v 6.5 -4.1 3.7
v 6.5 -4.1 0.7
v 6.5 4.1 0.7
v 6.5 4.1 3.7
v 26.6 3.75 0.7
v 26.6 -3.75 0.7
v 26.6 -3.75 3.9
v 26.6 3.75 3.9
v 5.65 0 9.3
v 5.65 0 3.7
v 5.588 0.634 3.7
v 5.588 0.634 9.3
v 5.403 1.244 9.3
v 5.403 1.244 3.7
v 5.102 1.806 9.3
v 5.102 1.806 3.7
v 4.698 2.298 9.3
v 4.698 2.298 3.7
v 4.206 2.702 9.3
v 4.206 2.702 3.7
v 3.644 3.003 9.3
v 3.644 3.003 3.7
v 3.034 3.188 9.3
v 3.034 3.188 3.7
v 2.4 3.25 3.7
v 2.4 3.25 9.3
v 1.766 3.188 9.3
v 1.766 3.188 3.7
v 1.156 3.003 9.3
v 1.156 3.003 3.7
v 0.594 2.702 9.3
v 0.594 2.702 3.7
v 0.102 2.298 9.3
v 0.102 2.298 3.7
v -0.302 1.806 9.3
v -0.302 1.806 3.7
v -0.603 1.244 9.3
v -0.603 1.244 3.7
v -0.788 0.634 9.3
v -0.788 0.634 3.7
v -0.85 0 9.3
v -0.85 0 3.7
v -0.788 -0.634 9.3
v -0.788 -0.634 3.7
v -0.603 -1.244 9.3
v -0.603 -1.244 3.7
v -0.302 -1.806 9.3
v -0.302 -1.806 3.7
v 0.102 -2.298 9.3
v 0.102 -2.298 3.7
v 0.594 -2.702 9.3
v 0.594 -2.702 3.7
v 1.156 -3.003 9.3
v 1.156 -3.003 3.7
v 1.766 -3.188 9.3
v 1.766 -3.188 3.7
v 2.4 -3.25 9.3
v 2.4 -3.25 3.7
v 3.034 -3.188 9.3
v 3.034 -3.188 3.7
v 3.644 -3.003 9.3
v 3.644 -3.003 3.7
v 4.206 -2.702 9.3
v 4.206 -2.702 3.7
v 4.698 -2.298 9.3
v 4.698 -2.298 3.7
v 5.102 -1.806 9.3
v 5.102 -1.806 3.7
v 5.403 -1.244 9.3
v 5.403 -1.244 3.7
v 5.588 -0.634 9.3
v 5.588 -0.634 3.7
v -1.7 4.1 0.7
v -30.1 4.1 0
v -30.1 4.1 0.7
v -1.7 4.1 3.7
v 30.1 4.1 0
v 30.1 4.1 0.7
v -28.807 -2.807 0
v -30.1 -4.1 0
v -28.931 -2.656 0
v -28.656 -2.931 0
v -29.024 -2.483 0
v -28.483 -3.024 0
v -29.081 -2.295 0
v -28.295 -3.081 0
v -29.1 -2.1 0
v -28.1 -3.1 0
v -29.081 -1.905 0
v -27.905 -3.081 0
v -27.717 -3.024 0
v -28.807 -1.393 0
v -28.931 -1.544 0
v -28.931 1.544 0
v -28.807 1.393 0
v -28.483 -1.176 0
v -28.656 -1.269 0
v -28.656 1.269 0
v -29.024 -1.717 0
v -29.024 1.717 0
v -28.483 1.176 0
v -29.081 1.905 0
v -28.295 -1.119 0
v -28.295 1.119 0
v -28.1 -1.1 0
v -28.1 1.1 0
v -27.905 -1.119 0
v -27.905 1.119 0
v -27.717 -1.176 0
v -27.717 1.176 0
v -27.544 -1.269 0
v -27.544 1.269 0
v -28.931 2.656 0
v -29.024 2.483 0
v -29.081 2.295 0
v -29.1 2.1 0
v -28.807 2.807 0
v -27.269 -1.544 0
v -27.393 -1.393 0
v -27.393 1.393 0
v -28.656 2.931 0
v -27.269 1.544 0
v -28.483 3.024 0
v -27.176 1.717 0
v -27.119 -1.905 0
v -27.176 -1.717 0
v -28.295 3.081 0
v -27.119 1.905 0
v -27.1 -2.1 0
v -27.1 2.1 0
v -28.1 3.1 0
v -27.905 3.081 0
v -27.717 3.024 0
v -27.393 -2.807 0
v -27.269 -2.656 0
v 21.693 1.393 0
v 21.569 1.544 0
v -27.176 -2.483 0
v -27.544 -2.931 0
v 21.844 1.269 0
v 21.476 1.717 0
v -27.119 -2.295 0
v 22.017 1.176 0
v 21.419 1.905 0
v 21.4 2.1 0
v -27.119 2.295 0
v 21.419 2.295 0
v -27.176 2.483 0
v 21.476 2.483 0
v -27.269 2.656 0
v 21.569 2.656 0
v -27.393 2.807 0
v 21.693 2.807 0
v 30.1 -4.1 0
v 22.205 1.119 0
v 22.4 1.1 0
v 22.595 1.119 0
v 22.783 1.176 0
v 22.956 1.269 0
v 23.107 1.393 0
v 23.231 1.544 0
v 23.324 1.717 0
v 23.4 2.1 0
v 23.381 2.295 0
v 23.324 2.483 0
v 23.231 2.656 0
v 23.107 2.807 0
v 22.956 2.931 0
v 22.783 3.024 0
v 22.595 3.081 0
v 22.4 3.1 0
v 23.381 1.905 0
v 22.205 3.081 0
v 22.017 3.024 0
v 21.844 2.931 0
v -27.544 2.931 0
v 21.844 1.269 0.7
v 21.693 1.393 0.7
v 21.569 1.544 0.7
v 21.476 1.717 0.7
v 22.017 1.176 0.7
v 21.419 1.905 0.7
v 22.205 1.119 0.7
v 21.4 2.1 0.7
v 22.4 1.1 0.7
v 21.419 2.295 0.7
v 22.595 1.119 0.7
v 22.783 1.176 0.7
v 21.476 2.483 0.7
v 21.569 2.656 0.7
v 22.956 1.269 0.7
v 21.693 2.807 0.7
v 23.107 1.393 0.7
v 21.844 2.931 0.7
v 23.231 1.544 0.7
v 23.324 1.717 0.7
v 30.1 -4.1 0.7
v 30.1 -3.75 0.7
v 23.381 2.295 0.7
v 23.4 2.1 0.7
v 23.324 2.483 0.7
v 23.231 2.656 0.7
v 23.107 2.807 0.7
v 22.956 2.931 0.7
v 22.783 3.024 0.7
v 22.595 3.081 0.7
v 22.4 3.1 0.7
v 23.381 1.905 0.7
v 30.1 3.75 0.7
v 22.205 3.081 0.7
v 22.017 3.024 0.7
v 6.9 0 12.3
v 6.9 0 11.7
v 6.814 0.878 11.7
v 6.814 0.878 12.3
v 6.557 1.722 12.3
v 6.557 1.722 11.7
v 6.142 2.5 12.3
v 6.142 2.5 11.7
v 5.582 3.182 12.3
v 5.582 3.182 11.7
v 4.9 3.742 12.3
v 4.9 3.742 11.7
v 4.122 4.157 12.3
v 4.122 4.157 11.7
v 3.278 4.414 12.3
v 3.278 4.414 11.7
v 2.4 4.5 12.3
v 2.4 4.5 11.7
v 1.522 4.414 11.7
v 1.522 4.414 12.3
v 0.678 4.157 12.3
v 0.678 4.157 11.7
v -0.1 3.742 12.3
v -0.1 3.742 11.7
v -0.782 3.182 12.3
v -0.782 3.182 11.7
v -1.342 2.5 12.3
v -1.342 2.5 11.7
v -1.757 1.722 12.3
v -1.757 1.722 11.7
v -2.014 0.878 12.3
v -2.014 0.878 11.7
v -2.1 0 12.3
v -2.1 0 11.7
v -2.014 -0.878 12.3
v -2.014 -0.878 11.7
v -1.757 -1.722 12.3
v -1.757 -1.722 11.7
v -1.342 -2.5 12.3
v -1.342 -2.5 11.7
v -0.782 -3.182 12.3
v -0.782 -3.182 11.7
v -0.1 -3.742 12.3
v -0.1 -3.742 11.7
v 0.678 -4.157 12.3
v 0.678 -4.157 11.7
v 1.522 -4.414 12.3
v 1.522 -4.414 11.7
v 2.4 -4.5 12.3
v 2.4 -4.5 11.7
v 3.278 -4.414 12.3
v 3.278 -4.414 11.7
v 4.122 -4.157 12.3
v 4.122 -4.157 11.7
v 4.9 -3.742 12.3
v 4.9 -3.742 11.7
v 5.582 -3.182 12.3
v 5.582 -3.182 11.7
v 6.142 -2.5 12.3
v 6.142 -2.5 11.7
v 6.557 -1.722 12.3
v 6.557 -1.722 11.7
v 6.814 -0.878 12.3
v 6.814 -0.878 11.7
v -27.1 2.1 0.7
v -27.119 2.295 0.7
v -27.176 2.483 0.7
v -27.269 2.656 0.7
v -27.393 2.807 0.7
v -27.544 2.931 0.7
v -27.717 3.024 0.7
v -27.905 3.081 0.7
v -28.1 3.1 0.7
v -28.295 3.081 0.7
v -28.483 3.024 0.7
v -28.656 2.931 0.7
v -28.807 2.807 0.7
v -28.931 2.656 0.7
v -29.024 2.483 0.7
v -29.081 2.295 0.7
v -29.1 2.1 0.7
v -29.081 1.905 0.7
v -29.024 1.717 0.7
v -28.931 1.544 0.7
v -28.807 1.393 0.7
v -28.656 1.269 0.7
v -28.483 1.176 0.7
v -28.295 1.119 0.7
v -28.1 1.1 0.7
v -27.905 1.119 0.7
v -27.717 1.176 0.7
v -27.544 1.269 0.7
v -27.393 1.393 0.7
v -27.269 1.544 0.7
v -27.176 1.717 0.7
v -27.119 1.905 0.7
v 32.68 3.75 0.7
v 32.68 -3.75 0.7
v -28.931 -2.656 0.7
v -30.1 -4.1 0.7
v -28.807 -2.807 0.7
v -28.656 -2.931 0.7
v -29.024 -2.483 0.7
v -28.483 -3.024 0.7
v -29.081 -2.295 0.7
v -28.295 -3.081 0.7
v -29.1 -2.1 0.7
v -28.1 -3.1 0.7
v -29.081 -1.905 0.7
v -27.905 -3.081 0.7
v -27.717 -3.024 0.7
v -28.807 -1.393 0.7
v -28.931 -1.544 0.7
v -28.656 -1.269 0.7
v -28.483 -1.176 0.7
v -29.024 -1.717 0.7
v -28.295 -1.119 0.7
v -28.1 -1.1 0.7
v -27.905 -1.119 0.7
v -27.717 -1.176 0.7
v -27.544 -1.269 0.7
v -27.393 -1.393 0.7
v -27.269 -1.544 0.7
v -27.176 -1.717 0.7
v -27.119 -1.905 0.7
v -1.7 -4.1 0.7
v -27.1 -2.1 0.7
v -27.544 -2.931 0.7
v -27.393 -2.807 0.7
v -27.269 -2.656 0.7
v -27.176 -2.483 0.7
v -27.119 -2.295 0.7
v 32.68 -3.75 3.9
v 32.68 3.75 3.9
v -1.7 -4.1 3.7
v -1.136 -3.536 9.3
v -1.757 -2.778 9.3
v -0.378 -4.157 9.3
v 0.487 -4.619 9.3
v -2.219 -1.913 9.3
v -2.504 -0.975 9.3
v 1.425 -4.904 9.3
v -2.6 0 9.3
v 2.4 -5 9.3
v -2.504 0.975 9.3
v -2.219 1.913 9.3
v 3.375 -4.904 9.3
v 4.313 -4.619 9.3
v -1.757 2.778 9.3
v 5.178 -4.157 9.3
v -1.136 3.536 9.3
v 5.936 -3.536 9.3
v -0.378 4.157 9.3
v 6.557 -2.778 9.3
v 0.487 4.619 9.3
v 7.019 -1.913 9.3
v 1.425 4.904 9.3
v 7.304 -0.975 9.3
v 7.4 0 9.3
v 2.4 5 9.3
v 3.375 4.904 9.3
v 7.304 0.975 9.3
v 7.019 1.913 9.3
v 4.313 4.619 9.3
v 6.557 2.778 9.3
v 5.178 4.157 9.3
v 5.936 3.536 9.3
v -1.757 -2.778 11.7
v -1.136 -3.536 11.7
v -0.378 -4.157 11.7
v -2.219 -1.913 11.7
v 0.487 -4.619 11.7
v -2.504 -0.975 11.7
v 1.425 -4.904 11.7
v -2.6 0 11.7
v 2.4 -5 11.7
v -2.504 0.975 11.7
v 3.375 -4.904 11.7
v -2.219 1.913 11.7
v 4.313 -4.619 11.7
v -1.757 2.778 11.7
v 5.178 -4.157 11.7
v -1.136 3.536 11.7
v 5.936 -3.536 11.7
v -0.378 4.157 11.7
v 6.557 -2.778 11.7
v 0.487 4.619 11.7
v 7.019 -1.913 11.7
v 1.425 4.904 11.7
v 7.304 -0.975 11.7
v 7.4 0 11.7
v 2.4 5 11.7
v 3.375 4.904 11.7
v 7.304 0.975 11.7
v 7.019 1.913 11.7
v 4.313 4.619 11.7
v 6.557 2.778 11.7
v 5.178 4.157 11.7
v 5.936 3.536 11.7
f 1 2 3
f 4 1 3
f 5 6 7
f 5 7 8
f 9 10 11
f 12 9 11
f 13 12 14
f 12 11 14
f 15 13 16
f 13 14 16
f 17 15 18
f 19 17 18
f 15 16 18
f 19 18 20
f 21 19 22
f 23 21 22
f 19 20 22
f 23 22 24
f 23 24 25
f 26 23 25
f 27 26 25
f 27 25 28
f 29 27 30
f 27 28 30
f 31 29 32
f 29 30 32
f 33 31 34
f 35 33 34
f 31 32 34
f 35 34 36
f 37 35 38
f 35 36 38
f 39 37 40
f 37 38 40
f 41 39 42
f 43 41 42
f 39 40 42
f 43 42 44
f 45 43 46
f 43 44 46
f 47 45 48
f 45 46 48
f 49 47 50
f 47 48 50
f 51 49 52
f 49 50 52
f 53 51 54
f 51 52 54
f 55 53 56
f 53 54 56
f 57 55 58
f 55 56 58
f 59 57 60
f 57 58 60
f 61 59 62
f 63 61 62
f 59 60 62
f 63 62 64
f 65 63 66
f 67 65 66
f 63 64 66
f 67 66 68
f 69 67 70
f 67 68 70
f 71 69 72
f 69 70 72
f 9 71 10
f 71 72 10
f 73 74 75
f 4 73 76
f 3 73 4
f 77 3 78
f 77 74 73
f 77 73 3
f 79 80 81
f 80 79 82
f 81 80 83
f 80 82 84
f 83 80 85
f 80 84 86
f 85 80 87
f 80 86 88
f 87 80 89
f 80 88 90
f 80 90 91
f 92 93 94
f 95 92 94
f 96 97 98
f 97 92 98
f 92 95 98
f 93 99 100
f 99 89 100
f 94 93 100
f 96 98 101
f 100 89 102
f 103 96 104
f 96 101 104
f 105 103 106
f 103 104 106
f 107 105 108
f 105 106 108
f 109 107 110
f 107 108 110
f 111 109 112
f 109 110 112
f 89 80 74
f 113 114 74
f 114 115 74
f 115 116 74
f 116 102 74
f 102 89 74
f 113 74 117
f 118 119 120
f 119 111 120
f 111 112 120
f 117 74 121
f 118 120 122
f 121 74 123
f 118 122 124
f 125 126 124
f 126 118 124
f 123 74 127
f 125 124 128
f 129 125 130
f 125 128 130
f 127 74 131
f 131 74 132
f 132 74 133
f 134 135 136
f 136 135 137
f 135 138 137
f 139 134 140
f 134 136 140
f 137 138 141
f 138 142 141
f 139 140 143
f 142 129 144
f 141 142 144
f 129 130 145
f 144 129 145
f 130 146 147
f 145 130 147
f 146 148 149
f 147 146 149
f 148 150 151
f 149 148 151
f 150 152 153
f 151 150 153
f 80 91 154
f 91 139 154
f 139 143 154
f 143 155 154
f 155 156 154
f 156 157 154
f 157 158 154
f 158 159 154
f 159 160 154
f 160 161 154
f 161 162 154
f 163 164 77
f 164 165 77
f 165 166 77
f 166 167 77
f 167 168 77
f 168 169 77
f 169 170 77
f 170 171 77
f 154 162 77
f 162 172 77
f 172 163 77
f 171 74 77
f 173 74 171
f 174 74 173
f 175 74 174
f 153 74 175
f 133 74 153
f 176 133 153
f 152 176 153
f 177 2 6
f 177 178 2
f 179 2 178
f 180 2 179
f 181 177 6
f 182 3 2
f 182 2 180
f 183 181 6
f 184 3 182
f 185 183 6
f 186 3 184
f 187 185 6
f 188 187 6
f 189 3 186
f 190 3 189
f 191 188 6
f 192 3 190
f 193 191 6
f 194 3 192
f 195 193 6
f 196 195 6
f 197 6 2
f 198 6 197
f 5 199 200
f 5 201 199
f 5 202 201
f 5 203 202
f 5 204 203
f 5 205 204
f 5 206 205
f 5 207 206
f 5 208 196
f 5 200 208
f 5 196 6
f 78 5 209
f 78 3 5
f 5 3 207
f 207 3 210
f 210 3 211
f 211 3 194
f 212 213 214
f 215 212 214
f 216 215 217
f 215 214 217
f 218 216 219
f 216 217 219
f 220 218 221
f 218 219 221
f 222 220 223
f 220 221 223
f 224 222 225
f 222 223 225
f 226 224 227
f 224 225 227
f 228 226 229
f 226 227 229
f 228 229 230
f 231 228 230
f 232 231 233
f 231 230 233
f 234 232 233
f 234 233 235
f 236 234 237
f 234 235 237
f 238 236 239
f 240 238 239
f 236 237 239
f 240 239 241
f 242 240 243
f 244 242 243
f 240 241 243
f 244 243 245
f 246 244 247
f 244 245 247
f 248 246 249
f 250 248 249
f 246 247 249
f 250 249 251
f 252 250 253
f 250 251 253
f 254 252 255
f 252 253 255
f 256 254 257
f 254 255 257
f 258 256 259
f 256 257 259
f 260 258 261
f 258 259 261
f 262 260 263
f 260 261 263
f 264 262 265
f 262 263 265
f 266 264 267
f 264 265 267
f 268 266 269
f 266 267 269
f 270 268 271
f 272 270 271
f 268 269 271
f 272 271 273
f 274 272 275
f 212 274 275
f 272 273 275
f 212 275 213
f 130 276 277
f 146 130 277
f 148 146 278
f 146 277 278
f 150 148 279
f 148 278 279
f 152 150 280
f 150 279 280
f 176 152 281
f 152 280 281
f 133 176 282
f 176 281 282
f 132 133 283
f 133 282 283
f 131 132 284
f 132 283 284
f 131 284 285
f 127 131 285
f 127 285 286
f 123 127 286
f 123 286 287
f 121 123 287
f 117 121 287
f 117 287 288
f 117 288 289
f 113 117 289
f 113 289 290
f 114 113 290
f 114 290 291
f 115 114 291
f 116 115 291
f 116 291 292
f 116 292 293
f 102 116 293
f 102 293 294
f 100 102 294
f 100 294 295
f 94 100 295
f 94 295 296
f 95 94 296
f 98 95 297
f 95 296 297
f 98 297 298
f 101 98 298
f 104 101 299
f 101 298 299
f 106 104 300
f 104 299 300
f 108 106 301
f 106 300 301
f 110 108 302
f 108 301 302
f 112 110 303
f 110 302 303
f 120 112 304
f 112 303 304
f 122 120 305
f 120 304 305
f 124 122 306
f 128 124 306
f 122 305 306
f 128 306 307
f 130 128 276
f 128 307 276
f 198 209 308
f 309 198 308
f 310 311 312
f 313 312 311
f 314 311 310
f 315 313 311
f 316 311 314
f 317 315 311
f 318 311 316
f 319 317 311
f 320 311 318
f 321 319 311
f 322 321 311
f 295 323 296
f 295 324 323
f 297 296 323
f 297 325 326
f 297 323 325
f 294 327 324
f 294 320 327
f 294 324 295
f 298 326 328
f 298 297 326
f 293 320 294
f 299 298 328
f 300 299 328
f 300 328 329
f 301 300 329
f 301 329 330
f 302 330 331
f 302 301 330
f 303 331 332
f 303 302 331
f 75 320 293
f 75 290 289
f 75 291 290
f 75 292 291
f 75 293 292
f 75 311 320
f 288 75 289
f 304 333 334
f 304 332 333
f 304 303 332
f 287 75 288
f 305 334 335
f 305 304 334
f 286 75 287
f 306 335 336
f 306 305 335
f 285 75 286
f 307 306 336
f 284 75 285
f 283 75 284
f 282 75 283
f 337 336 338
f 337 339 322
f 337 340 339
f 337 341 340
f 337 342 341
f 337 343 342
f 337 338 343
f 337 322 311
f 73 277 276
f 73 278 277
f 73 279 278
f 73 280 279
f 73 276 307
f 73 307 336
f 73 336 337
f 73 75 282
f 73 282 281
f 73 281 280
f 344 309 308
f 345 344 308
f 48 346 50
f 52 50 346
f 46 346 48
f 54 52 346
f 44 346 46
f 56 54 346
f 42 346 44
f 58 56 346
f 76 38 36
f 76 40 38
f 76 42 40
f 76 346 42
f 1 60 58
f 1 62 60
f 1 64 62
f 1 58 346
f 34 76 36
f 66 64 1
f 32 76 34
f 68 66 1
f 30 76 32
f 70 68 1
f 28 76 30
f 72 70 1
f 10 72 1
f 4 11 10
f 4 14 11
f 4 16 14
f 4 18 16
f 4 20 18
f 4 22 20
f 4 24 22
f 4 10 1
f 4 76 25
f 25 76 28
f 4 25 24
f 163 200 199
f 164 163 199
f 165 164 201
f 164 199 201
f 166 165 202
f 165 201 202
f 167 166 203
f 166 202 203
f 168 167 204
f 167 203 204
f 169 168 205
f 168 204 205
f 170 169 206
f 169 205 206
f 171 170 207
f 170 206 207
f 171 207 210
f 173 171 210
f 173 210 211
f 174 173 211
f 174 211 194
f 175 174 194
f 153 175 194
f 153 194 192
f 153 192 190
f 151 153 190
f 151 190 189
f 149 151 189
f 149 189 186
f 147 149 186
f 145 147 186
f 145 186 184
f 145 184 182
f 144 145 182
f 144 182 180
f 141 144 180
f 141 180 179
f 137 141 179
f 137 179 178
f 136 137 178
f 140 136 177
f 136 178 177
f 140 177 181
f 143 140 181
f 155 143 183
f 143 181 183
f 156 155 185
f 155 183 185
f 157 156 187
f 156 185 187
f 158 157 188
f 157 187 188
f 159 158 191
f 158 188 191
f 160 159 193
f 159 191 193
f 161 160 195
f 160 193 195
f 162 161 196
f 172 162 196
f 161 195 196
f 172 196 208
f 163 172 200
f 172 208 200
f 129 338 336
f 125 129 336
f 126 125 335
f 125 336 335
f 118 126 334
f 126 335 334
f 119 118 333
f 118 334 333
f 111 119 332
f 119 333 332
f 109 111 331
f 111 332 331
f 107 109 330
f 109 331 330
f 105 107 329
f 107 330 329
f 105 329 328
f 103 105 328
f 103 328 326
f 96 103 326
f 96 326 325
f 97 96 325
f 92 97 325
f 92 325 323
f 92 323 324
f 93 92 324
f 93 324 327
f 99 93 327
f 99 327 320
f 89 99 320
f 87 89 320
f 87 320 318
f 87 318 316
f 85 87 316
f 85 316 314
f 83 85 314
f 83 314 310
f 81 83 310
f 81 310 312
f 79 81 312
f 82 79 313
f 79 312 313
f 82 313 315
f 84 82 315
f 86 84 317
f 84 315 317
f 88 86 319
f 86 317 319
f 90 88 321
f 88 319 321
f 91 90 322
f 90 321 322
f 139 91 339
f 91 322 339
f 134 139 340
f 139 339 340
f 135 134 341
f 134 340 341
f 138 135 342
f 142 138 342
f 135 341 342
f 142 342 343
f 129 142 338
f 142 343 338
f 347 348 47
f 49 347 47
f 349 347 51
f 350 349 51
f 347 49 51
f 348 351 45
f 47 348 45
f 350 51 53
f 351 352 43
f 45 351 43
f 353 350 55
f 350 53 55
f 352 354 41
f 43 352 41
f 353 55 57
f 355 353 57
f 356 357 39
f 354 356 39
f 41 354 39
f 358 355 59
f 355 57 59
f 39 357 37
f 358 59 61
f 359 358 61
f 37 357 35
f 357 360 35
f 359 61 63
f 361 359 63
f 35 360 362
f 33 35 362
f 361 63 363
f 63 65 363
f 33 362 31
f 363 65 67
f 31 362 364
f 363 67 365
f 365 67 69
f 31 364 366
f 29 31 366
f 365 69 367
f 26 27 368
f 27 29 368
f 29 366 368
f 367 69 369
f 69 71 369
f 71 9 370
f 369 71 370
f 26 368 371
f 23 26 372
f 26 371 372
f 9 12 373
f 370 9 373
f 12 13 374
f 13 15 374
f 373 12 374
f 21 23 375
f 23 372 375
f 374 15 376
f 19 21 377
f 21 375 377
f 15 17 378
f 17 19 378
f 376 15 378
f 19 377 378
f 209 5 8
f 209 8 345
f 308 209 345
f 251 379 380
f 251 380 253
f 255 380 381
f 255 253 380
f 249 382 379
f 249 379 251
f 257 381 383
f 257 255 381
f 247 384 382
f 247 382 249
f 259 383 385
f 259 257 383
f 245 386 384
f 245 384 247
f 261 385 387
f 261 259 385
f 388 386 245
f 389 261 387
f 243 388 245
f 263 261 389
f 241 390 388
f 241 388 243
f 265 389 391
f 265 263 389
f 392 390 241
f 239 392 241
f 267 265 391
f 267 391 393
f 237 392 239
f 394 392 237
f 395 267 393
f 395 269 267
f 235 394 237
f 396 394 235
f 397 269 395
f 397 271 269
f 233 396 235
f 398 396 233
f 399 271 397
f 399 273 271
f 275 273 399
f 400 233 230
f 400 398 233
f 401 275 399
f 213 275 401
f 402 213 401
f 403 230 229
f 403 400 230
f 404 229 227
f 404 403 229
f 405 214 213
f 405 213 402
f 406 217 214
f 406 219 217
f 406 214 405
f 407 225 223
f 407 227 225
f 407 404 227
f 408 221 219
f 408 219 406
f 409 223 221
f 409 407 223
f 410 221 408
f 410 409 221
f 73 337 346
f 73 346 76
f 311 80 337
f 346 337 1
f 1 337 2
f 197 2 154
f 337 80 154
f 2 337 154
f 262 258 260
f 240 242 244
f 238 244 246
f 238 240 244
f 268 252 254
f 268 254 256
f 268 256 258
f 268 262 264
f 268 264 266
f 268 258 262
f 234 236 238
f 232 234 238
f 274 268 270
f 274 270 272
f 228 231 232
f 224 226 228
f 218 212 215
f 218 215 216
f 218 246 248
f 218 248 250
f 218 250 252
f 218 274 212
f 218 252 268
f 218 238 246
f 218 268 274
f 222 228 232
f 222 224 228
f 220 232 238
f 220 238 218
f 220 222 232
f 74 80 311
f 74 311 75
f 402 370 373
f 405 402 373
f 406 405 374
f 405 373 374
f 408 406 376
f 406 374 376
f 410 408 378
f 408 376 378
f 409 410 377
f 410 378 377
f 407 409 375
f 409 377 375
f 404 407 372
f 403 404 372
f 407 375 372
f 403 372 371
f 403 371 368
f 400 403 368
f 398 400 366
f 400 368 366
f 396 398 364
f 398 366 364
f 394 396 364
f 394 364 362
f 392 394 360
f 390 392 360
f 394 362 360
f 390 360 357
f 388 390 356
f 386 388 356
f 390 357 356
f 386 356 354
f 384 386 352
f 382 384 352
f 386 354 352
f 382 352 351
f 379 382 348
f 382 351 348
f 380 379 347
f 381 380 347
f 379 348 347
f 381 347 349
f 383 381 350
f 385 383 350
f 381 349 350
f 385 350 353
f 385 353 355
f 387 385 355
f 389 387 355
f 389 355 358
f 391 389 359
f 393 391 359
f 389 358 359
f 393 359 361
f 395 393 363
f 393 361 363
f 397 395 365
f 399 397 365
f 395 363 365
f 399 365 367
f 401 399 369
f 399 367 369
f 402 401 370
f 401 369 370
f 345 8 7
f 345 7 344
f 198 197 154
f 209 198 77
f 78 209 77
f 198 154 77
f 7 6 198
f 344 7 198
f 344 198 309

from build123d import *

# Parameters (mm, degrees)
SKETCH_W     = 60.2
SKETCH_H     = 8.2
PAD_DEPTH    = 0.7
SKETCH001_R  = 1
POCKET_DEPTH = 0.701
SKETCH002_W  = 8.2
SKETCH002_H  = 8.2
PAD001_DEPTH = 3
SKETCH003_R  = 3.25
PAD002_DEPTH = 5.6
SKETCH004_R  = 5
PAD003_DEPTH = 2.4
SKETCH005_R  = 4.5
PAD004_DEPTH = 0.6
SKETCH006_W  = 6.08
SKETCH006_H  = 7.5
PAD005_DEPTH = 3.2


with BuildPart() as part:
    # Sketch → Pad (new body)
    with BuildSketch(Plane.XY):
        Rectangle(SKETCH_W, SKETCH_H)
    extrude(amount=PAD_DEPTH)

    # Sketch001 → Pocket (cut, through all)
    with BuildSketch(Plane.XY.offset(0.7)):
        with Locations((-28.1, 2.1)):
            Circle(SKETCH001_R)
        with Locations((-28.1, -2.1)):
            Circle(SKETCH001_R)
        with Locations((22.4, 2.1)):
            Circle(SKETCH001_R)
    extrude(amount=-POCKET_DEPTH, mode=Mode.SUBTRACT)

    # Sketch002 → Pad001 (new body)
    with BuildSketch(Plane.XY.offset(0.7)):
        with Locations((2.4, 0)):
            Rectangle(SKETCH002_W, SKETCH002_H)
    extrude(amount=PAD001_DEPTH)

    # Sketch003 → Pad002 (new body)
    with BuildSketch(Plane.XY.offset(3.7)):
        with Locations((2.4, 0)):
            Circle(SKETCH003_R)
    extrude(amount=PAD002_DEPTH)

    # Sketch004 → Pad003 (new body)
    with BuildSketch(Plane.XY.offset(9.3)):
        with Locations((2.4, 0)):
            Circle(SKETCH004_R)
    extrude(amount=PAD003_DEPTH)

    # Sketch005 → Pad004 (new body)
    with BuildSketch(Plane.XY.offset(11.7)):
        with Locations((2.4, 0)):
            Circle(SKETCH005_R)
    extrude(amount=PAD004_DEPTH)

    # Sketch006 → Pad005 (new body)
    with BuildSketch(Plane.XY.offset(0.7)):
        with Locations((29.64, 0)):
            Rectangle(SKETCH006_W, SKETCH006_H)
    extrude(amount=PAD005_DEPTH)


solid = part.part
